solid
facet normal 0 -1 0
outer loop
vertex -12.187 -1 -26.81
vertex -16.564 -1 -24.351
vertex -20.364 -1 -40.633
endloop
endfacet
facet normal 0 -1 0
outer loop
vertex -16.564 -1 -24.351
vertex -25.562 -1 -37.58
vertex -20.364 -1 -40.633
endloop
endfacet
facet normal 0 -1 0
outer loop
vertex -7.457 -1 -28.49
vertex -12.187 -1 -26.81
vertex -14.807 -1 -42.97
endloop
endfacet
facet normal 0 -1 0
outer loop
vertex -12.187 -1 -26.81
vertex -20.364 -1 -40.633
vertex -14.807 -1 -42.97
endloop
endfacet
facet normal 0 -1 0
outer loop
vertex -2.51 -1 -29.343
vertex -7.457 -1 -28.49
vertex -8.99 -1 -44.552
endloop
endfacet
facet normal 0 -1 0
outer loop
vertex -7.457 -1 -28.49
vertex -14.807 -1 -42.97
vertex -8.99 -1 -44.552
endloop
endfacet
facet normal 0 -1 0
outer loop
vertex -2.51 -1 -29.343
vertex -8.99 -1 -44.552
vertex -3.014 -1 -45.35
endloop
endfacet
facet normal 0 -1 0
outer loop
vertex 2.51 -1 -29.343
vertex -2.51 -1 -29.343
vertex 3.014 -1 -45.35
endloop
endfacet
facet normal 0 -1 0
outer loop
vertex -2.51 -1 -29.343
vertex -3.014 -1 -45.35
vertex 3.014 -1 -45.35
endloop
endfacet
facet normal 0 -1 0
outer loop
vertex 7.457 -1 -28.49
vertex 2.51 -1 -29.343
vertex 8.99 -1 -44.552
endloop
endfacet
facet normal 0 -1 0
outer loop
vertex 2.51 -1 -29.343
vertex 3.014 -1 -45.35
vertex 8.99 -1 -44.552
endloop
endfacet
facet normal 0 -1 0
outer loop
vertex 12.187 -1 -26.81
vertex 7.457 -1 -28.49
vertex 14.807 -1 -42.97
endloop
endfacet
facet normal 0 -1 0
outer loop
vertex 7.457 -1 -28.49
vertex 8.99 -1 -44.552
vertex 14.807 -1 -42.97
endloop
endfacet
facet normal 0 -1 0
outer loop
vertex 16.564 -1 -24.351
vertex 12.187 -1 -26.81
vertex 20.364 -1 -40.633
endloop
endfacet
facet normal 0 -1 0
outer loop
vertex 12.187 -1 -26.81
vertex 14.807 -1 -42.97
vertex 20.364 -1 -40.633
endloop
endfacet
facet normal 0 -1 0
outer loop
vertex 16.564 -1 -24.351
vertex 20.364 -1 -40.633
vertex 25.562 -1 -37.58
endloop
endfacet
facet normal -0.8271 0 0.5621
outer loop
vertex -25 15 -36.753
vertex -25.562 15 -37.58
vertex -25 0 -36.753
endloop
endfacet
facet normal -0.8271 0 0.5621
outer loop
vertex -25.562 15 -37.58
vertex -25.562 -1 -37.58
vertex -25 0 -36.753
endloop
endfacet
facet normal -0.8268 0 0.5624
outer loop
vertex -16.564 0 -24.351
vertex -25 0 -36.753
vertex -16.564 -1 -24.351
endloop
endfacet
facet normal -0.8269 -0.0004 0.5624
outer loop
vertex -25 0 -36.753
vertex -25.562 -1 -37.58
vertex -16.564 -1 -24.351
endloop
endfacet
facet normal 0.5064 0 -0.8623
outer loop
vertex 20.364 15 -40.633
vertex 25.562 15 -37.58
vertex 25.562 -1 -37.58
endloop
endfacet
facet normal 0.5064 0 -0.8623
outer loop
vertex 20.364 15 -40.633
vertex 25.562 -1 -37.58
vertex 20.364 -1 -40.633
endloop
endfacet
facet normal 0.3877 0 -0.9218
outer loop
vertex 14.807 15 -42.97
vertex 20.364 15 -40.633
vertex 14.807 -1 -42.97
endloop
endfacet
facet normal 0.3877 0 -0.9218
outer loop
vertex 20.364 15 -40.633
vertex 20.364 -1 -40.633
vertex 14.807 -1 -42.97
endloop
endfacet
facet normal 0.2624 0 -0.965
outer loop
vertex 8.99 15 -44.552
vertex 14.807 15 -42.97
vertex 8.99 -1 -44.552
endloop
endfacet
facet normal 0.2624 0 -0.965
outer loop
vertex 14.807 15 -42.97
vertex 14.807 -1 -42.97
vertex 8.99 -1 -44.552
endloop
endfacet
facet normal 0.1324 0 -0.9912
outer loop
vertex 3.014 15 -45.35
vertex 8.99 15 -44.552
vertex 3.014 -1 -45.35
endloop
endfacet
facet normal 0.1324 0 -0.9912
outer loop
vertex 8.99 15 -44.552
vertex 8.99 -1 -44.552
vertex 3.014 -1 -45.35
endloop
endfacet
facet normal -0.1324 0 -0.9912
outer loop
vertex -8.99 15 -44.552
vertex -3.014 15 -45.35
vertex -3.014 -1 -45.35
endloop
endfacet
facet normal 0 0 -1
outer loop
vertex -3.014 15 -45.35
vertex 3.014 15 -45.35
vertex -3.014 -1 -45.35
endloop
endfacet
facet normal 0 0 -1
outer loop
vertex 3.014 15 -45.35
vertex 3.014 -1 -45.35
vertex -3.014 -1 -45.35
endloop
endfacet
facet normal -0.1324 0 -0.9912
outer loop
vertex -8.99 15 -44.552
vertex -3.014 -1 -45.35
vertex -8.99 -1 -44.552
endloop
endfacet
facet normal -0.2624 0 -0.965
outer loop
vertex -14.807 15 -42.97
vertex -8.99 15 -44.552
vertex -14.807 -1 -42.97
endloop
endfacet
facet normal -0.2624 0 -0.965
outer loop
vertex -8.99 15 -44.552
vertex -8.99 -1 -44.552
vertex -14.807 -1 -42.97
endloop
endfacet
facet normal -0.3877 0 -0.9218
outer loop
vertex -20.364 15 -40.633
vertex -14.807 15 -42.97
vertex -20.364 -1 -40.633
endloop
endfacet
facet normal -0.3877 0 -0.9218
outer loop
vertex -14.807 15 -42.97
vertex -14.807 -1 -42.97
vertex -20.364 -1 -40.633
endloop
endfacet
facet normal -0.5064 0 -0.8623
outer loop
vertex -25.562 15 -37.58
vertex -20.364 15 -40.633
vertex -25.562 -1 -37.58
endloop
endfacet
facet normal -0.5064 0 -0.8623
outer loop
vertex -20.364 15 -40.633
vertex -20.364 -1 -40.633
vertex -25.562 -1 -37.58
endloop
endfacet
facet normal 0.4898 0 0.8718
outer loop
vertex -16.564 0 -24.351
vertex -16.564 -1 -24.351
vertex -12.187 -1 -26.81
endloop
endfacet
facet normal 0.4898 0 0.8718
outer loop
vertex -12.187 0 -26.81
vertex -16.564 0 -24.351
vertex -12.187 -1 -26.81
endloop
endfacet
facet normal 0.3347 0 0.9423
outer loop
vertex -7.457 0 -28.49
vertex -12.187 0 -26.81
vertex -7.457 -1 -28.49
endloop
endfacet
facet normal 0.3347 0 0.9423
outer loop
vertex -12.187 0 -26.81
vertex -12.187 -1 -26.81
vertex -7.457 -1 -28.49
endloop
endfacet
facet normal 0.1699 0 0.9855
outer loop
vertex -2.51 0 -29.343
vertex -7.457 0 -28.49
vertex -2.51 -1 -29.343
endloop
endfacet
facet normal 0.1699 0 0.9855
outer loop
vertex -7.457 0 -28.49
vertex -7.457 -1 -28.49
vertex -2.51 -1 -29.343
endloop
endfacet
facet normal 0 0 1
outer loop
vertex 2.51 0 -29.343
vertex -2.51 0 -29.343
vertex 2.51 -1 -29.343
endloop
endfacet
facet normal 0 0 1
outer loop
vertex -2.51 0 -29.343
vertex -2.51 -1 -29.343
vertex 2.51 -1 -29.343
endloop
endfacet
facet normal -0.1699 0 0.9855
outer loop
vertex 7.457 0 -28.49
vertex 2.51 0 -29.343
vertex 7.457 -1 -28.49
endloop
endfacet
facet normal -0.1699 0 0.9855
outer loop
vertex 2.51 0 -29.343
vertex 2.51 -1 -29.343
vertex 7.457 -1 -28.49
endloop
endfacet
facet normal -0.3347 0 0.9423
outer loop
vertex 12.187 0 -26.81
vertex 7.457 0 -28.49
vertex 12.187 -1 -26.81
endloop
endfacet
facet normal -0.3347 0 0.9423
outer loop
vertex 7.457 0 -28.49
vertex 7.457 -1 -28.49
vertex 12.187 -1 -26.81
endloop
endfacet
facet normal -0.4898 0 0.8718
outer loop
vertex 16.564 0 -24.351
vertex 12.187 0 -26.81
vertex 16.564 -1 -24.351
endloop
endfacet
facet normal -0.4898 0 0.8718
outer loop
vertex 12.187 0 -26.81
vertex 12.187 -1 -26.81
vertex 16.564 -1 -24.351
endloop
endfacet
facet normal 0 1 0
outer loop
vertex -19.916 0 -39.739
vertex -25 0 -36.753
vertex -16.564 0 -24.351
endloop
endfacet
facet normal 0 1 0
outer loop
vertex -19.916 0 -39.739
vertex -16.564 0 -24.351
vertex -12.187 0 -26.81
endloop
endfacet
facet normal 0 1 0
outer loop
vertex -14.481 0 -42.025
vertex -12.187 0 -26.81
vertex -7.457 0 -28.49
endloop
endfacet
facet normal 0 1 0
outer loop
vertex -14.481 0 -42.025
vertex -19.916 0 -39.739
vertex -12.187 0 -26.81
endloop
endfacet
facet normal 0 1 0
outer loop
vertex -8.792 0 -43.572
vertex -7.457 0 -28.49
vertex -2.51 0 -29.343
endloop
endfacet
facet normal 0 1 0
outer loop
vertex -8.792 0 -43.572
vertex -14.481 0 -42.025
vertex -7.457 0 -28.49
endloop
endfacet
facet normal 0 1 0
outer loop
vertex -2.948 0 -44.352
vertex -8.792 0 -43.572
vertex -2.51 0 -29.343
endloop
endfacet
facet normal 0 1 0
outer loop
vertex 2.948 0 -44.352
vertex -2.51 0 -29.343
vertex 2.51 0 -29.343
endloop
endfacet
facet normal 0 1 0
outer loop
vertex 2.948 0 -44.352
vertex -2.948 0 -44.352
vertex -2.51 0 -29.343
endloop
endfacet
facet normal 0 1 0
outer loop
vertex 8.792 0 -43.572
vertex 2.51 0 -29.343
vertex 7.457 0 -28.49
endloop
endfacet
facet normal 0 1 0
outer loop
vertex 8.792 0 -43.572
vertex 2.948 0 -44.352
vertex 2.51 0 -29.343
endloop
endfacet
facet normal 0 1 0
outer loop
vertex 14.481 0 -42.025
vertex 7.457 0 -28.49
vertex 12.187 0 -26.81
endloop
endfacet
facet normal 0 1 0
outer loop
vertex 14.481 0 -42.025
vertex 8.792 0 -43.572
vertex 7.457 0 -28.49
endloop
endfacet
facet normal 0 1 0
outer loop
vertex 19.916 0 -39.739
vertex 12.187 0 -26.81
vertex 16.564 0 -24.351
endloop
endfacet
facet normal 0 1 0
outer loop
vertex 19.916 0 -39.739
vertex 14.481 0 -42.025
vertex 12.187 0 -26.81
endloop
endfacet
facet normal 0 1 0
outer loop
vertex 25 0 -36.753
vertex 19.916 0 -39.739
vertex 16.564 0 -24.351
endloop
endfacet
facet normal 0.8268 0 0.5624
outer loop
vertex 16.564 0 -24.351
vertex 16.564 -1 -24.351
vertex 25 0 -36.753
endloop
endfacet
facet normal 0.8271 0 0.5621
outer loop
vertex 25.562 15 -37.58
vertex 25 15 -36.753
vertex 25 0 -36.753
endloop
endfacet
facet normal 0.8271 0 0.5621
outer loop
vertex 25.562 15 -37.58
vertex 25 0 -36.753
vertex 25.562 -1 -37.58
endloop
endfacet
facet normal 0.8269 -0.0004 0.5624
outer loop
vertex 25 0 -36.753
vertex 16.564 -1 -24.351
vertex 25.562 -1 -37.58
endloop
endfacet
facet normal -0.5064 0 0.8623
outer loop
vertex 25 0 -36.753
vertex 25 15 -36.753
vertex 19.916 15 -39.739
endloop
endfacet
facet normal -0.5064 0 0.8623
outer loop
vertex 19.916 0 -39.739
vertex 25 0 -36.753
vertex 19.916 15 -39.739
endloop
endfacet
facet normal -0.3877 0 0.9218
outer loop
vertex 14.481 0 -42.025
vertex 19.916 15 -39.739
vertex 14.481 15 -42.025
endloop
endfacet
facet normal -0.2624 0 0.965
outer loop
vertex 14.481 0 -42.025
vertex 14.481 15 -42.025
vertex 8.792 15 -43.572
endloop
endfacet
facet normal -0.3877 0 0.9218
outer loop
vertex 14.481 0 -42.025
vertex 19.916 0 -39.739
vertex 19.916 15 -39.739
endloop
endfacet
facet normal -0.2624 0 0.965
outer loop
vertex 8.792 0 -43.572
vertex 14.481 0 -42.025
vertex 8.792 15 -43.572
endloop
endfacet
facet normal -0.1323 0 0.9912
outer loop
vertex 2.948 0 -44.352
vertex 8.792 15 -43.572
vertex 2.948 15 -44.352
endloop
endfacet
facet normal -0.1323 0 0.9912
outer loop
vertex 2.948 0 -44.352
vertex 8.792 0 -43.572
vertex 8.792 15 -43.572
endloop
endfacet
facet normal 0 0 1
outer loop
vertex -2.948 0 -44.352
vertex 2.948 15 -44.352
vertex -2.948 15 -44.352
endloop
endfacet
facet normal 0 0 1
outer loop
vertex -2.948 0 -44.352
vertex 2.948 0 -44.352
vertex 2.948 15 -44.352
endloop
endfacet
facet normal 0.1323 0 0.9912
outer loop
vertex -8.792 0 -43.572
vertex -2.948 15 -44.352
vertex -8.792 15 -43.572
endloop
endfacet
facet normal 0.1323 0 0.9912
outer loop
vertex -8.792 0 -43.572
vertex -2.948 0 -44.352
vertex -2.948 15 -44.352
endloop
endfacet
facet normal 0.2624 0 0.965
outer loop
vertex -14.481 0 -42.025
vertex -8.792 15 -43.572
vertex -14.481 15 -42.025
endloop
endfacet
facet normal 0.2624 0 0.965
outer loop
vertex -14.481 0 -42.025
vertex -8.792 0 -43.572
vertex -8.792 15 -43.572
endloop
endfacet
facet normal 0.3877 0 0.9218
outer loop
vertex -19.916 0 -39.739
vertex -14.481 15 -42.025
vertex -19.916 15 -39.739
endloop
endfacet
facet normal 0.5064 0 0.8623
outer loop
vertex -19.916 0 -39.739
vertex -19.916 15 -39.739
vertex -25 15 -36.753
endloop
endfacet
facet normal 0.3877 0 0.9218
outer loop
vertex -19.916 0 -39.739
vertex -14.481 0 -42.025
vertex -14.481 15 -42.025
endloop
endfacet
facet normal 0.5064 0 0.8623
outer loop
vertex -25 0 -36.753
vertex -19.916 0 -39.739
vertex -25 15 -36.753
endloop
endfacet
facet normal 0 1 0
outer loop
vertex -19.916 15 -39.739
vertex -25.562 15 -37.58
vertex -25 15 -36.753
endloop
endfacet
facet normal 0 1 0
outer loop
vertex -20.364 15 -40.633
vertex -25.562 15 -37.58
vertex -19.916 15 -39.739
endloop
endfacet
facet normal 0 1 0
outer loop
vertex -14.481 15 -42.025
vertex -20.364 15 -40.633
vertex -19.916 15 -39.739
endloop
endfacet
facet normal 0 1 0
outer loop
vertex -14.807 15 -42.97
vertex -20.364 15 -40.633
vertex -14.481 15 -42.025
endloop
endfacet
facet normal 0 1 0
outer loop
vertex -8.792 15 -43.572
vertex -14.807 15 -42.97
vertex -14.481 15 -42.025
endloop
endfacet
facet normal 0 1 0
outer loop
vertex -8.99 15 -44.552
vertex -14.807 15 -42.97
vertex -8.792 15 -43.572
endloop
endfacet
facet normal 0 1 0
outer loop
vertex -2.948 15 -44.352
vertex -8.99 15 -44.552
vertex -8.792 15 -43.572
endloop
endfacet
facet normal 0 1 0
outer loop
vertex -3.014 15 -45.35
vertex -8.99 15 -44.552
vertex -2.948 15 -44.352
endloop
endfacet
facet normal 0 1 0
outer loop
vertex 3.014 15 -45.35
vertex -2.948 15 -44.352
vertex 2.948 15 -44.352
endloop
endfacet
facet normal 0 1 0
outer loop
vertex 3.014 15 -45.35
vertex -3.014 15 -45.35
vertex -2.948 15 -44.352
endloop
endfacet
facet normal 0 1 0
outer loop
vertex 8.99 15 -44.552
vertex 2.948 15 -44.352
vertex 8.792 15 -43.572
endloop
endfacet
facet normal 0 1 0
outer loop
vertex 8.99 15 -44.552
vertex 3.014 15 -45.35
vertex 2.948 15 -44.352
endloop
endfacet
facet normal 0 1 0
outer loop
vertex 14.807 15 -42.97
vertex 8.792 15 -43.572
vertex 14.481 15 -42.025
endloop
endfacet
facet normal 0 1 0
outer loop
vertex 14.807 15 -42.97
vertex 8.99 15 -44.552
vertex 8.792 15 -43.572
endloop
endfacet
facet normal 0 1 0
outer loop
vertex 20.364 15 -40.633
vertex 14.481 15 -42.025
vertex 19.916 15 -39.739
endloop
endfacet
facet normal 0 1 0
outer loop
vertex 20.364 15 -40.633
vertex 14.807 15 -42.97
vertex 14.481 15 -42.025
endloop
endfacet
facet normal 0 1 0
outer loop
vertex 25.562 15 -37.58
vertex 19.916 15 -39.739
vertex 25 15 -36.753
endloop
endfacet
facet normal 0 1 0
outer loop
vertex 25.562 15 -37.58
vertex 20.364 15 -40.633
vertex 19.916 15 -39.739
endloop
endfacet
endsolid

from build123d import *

# Parameters (mm, degrees)
BOSS_EXTRUDE1_DEPTH = 15
SHELL1_T            = 1


with BuildPart() as part:
    # Sketch1 → Boss-Extrude1 (new body)
    with BuildSketch(Plane(origin=(0, 0, 0), x_dir=(1, 0, 0), z_dir=(0, 1, 0))):
        with BuildLine():
            ThreePointArc((25, 36.753265161), (0, 44.45), (-25, 36.753265161))
            Line((-25, 36.753265161), (-16.563554556, 24.350588504))
            ThreePointArc((-16.563554556, 24.350588504), (0, 29.45), (16.563554556, 24.350588504))
            Line((16.563554556, 24.350588504), (25, 36.753265161))
        make_face()
    extrude(amount=BOSS_EXTRUDE1_DEPTH)

    # Shell1
    shell1_openings = [part.faces().sort_by_distance(p)[0] for p in [
        (20.781777278, 7.5, -30.551926832),
        (-20.781777278, 7.5, -30.551926832),
        (0, 7.5, -29.45),
        (0, 15, -35.269418501),
    ]]
    offset(amount=SHELL1_T, openings=shell1_openings, kind=Kind.INTERSECTION)


solid = part.part
